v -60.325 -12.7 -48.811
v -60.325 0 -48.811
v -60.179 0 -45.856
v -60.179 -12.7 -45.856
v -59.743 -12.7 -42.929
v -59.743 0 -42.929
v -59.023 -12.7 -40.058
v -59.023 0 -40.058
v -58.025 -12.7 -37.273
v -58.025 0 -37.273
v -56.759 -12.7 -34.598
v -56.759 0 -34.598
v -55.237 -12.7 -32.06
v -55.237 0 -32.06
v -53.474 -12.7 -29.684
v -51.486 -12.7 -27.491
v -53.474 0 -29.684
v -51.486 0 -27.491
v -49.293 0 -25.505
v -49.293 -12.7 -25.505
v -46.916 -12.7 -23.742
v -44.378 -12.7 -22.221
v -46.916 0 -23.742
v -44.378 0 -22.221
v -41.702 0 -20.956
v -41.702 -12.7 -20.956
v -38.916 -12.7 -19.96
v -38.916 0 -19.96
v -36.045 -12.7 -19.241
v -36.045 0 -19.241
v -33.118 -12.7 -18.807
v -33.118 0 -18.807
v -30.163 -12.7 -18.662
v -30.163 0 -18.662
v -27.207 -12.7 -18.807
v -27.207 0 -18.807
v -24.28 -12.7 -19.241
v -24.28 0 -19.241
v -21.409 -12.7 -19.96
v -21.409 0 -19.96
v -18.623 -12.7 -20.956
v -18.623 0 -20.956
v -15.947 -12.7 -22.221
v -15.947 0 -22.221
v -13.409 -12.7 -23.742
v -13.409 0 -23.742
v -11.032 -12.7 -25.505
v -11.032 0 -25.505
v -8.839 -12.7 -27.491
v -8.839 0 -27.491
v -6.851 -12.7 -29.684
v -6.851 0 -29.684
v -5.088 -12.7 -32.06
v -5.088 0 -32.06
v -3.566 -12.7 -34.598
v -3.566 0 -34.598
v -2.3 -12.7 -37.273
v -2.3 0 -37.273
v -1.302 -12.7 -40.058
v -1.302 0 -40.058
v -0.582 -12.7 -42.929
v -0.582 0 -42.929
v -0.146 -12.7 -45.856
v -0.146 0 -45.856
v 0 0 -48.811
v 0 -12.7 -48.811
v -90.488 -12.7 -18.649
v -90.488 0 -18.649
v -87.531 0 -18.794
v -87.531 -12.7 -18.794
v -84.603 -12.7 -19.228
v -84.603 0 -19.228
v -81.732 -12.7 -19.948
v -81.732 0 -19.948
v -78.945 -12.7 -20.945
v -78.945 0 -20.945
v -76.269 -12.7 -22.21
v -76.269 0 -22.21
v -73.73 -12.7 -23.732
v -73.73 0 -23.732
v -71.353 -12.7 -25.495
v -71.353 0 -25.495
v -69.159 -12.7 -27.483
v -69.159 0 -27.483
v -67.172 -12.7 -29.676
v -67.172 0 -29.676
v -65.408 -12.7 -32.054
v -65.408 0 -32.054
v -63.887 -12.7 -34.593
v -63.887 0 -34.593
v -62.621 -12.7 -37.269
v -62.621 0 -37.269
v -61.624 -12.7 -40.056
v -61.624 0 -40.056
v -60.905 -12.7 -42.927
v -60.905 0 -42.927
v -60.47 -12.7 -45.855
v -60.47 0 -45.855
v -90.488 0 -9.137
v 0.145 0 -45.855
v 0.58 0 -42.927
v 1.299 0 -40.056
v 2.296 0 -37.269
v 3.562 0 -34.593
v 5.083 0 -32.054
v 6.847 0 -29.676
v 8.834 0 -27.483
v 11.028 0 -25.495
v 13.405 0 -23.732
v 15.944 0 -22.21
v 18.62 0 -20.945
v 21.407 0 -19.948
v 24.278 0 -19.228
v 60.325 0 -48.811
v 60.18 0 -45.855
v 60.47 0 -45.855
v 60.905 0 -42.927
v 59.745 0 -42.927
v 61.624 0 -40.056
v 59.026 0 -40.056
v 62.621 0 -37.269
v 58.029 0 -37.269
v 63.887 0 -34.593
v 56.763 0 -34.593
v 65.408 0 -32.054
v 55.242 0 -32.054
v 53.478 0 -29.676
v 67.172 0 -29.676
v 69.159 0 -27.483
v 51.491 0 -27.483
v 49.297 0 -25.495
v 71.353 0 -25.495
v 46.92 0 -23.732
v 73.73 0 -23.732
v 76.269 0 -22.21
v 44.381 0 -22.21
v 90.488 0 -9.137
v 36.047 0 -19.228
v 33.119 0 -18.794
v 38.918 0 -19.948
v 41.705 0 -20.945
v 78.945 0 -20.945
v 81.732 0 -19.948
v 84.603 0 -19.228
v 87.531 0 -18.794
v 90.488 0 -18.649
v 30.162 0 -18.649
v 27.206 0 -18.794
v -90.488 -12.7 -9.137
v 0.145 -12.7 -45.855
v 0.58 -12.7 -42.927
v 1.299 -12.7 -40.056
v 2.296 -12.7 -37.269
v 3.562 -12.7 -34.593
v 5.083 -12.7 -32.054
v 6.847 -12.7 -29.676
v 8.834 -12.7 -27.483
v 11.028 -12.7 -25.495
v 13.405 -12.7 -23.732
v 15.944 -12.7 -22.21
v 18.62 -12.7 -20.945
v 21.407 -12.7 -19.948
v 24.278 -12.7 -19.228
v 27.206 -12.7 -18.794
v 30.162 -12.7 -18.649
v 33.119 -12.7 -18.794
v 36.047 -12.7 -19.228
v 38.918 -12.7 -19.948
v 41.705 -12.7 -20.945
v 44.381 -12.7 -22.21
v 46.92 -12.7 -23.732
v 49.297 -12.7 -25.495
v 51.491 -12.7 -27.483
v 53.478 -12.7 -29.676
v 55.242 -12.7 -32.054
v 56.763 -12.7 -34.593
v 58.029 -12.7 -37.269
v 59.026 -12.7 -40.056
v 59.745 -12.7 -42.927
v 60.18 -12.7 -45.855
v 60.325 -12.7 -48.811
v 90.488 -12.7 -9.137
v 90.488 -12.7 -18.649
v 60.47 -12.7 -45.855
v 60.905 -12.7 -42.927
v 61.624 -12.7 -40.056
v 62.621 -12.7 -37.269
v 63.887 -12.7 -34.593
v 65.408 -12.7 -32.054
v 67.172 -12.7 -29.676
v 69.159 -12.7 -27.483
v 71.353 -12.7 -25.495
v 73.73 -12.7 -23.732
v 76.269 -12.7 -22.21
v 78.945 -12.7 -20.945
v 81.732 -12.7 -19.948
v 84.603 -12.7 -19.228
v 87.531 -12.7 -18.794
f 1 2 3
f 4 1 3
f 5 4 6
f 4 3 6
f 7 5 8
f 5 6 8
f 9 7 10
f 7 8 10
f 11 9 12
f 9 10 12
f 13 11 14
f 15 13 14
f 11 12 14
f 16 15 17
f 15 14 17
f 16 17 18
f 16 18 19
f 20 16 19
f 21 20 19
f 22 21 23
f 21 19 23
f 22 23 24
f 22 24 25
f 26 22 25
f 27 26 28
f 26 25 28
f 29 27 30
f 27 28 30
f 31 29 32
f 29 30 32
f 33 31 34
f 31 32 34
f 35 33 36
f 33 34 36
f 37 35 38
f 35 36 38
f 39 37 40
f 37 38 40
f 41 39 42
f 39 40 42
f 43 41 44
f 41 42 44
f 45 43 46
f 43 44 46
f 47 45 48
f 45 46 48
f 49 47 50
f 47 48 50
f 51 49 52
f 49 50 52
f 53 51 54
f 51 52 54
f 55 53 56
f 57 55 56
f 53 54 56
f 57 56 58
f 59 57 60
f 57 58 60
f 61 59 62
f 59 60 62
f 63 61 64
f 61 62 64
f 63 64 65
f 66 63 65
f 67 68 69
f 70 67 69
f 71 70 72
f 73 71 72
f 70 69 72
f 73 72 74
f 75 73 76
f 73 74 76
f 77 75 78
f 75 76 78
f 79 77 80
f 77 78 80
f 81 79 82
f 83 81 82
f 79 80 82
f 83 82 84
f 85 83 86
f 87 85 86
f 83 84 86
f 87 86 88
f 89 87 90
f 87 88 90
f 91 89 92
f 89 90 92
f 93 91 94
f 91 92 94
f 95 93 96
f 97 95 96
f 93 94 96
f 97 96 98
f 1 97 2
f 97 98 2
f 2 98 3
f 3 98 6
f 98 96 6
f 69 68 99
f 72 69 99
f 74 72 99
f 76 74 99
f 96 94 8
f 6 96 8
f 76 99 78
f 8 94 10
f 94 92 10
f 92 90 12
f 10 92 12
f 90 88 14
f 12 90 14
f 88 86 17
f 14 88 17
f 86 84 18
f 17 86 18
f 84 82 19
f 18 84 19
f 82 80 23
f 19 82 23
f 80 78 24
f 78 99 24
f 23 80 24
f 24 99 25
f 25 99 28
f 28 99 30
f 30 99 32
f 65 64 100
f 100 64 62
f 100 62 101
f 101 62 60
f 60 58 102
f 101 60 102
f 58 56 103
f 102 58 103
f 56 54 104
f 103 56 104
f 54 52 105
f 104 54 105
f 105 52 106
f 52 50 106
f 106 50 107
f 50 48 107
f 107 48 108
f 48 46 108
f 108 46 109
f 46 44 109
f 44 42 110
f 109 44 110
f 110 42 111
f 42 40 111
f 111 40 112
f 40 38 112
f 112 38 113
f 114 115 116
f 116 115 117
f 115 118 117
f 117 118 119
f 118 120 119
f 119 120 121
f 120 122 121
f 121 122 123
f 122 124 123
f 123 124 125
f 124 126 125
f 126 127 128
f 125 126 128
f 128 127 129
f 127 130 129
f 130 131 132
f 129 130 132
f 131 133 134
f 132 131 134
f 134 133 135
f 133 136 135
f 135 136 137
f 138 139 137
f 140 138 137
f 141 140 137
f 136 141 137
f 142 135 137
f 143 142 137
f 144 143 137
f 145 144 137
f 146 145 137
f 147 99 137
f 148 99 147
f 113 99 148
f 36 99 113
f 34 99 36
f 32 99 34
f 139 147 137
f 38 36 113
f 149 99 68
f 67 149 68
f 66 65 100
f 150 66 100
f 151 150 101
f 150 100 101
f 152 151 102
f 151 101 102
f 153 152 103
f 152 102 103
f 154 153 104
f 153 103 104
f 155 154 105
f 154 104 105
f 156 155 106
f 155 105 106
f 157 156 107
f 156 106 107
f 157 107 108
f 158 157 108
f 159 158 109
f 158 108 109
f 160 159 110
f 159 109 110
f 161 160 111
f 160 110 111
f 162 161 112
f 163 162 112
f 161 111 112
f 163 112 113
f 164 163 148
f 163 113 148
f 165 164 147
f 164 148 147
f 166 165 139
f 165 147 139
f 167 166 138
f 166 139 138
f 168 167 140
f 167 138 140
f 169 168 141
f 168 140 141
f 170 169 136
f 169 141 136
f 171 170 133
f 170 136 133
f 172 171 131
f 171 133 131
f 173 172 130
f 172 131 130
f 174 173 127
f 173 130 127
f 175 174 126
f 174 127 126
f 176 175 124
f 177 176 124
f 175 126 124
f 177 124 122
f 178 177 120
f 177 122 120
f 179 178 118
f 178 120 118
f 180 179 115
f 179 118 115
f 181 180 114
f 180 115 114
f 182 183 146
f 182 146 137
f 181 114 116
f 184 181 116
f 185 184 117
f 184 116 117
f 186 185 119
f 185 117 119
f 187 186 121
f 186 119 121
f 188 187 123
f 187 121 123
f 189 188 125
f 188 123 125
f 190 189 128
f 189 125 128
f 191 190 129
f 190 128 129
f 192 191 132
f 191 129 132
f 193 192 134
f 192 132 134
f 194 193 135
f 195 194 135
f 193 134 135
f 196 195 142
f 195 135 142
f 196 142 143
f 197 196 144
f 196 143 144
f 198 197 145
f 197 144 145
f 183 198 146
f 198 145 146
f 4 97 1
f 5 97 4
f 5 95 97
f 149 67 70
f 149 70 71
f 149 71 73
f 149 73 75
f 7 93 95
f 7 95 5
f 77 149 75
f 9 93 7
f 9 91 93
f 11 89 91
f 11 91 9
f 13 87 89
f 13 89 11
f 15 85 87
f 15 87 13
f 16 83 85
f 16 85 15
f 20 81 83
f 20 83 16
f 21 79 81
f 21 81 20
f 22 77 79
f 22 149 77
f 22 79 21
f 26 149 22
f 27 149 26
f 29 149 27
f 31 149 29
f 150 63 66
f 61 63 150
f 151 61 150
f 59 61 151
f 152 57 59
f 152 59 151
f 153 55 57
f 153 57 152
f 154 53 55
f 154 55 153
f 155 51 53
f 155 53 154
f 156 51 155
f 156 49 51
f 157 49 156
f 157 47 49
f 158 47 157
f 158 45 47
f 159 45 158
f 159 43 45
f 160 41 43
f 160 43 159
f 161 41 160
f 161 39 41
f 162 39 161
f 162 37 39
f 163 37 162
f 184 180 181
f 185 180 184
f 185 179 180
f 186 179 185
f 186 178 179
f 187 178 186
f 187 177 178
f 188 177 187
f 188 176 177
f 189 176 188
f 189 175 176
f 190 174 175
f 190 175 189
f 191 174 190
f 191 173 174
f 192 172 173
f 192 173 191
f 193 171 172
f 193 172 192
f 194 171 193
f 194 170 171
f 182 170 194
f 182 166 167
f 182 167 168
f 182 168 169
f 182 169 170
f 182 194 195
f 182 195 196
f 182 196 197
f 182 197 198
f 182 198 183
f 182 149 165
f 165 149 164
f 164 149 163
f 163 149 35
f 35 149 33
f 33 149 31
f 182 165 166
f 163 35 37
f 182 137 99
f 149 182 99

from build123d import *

# Parameters (mm, degrees)
F1_DEPTH = 12.7


# Not quite as in the source:
# - ends of sketch curves that miss each other by under 0.0002 mm in the source are joined


with BuildPart() as f1:
    # F0 (on Front) → F1 (new body)
    with BuildSketch(Plane.XZ):
        with BuildLine():
            Line((90.4875, -9.1365433148), (-90.4875, -9.1365433148))
            Line((-90.4875, -9.1365433148), (-90.4875, -18.6488433148))
            ThreePointArc((-90.4875, -18.6488433148), (-69.1593908483, -27.4832345546), (-60.3249986632, -48.8113433148))
            ThreePointArc((-60.3249986632, -48.8113433148), (-30.1625, -18.6615433148), (-2.6737e-06, -48.8113433154))
            ThreePointArc((-2.6737e-06, -48.8113433154), (30.1625, -18.6488433148), (60.325, -48.8113433148))
            ThreePointArc((60.325, -48.8113433148), (69.1593917125, -27.4832350273), (90.4875, -18.6488433148))
            Line((90.4875, -18.6488433148), (90.4875, -9.1365433148))
        make_face()
    extrude(amount=F1_DEPTH)


solid = f1.part
